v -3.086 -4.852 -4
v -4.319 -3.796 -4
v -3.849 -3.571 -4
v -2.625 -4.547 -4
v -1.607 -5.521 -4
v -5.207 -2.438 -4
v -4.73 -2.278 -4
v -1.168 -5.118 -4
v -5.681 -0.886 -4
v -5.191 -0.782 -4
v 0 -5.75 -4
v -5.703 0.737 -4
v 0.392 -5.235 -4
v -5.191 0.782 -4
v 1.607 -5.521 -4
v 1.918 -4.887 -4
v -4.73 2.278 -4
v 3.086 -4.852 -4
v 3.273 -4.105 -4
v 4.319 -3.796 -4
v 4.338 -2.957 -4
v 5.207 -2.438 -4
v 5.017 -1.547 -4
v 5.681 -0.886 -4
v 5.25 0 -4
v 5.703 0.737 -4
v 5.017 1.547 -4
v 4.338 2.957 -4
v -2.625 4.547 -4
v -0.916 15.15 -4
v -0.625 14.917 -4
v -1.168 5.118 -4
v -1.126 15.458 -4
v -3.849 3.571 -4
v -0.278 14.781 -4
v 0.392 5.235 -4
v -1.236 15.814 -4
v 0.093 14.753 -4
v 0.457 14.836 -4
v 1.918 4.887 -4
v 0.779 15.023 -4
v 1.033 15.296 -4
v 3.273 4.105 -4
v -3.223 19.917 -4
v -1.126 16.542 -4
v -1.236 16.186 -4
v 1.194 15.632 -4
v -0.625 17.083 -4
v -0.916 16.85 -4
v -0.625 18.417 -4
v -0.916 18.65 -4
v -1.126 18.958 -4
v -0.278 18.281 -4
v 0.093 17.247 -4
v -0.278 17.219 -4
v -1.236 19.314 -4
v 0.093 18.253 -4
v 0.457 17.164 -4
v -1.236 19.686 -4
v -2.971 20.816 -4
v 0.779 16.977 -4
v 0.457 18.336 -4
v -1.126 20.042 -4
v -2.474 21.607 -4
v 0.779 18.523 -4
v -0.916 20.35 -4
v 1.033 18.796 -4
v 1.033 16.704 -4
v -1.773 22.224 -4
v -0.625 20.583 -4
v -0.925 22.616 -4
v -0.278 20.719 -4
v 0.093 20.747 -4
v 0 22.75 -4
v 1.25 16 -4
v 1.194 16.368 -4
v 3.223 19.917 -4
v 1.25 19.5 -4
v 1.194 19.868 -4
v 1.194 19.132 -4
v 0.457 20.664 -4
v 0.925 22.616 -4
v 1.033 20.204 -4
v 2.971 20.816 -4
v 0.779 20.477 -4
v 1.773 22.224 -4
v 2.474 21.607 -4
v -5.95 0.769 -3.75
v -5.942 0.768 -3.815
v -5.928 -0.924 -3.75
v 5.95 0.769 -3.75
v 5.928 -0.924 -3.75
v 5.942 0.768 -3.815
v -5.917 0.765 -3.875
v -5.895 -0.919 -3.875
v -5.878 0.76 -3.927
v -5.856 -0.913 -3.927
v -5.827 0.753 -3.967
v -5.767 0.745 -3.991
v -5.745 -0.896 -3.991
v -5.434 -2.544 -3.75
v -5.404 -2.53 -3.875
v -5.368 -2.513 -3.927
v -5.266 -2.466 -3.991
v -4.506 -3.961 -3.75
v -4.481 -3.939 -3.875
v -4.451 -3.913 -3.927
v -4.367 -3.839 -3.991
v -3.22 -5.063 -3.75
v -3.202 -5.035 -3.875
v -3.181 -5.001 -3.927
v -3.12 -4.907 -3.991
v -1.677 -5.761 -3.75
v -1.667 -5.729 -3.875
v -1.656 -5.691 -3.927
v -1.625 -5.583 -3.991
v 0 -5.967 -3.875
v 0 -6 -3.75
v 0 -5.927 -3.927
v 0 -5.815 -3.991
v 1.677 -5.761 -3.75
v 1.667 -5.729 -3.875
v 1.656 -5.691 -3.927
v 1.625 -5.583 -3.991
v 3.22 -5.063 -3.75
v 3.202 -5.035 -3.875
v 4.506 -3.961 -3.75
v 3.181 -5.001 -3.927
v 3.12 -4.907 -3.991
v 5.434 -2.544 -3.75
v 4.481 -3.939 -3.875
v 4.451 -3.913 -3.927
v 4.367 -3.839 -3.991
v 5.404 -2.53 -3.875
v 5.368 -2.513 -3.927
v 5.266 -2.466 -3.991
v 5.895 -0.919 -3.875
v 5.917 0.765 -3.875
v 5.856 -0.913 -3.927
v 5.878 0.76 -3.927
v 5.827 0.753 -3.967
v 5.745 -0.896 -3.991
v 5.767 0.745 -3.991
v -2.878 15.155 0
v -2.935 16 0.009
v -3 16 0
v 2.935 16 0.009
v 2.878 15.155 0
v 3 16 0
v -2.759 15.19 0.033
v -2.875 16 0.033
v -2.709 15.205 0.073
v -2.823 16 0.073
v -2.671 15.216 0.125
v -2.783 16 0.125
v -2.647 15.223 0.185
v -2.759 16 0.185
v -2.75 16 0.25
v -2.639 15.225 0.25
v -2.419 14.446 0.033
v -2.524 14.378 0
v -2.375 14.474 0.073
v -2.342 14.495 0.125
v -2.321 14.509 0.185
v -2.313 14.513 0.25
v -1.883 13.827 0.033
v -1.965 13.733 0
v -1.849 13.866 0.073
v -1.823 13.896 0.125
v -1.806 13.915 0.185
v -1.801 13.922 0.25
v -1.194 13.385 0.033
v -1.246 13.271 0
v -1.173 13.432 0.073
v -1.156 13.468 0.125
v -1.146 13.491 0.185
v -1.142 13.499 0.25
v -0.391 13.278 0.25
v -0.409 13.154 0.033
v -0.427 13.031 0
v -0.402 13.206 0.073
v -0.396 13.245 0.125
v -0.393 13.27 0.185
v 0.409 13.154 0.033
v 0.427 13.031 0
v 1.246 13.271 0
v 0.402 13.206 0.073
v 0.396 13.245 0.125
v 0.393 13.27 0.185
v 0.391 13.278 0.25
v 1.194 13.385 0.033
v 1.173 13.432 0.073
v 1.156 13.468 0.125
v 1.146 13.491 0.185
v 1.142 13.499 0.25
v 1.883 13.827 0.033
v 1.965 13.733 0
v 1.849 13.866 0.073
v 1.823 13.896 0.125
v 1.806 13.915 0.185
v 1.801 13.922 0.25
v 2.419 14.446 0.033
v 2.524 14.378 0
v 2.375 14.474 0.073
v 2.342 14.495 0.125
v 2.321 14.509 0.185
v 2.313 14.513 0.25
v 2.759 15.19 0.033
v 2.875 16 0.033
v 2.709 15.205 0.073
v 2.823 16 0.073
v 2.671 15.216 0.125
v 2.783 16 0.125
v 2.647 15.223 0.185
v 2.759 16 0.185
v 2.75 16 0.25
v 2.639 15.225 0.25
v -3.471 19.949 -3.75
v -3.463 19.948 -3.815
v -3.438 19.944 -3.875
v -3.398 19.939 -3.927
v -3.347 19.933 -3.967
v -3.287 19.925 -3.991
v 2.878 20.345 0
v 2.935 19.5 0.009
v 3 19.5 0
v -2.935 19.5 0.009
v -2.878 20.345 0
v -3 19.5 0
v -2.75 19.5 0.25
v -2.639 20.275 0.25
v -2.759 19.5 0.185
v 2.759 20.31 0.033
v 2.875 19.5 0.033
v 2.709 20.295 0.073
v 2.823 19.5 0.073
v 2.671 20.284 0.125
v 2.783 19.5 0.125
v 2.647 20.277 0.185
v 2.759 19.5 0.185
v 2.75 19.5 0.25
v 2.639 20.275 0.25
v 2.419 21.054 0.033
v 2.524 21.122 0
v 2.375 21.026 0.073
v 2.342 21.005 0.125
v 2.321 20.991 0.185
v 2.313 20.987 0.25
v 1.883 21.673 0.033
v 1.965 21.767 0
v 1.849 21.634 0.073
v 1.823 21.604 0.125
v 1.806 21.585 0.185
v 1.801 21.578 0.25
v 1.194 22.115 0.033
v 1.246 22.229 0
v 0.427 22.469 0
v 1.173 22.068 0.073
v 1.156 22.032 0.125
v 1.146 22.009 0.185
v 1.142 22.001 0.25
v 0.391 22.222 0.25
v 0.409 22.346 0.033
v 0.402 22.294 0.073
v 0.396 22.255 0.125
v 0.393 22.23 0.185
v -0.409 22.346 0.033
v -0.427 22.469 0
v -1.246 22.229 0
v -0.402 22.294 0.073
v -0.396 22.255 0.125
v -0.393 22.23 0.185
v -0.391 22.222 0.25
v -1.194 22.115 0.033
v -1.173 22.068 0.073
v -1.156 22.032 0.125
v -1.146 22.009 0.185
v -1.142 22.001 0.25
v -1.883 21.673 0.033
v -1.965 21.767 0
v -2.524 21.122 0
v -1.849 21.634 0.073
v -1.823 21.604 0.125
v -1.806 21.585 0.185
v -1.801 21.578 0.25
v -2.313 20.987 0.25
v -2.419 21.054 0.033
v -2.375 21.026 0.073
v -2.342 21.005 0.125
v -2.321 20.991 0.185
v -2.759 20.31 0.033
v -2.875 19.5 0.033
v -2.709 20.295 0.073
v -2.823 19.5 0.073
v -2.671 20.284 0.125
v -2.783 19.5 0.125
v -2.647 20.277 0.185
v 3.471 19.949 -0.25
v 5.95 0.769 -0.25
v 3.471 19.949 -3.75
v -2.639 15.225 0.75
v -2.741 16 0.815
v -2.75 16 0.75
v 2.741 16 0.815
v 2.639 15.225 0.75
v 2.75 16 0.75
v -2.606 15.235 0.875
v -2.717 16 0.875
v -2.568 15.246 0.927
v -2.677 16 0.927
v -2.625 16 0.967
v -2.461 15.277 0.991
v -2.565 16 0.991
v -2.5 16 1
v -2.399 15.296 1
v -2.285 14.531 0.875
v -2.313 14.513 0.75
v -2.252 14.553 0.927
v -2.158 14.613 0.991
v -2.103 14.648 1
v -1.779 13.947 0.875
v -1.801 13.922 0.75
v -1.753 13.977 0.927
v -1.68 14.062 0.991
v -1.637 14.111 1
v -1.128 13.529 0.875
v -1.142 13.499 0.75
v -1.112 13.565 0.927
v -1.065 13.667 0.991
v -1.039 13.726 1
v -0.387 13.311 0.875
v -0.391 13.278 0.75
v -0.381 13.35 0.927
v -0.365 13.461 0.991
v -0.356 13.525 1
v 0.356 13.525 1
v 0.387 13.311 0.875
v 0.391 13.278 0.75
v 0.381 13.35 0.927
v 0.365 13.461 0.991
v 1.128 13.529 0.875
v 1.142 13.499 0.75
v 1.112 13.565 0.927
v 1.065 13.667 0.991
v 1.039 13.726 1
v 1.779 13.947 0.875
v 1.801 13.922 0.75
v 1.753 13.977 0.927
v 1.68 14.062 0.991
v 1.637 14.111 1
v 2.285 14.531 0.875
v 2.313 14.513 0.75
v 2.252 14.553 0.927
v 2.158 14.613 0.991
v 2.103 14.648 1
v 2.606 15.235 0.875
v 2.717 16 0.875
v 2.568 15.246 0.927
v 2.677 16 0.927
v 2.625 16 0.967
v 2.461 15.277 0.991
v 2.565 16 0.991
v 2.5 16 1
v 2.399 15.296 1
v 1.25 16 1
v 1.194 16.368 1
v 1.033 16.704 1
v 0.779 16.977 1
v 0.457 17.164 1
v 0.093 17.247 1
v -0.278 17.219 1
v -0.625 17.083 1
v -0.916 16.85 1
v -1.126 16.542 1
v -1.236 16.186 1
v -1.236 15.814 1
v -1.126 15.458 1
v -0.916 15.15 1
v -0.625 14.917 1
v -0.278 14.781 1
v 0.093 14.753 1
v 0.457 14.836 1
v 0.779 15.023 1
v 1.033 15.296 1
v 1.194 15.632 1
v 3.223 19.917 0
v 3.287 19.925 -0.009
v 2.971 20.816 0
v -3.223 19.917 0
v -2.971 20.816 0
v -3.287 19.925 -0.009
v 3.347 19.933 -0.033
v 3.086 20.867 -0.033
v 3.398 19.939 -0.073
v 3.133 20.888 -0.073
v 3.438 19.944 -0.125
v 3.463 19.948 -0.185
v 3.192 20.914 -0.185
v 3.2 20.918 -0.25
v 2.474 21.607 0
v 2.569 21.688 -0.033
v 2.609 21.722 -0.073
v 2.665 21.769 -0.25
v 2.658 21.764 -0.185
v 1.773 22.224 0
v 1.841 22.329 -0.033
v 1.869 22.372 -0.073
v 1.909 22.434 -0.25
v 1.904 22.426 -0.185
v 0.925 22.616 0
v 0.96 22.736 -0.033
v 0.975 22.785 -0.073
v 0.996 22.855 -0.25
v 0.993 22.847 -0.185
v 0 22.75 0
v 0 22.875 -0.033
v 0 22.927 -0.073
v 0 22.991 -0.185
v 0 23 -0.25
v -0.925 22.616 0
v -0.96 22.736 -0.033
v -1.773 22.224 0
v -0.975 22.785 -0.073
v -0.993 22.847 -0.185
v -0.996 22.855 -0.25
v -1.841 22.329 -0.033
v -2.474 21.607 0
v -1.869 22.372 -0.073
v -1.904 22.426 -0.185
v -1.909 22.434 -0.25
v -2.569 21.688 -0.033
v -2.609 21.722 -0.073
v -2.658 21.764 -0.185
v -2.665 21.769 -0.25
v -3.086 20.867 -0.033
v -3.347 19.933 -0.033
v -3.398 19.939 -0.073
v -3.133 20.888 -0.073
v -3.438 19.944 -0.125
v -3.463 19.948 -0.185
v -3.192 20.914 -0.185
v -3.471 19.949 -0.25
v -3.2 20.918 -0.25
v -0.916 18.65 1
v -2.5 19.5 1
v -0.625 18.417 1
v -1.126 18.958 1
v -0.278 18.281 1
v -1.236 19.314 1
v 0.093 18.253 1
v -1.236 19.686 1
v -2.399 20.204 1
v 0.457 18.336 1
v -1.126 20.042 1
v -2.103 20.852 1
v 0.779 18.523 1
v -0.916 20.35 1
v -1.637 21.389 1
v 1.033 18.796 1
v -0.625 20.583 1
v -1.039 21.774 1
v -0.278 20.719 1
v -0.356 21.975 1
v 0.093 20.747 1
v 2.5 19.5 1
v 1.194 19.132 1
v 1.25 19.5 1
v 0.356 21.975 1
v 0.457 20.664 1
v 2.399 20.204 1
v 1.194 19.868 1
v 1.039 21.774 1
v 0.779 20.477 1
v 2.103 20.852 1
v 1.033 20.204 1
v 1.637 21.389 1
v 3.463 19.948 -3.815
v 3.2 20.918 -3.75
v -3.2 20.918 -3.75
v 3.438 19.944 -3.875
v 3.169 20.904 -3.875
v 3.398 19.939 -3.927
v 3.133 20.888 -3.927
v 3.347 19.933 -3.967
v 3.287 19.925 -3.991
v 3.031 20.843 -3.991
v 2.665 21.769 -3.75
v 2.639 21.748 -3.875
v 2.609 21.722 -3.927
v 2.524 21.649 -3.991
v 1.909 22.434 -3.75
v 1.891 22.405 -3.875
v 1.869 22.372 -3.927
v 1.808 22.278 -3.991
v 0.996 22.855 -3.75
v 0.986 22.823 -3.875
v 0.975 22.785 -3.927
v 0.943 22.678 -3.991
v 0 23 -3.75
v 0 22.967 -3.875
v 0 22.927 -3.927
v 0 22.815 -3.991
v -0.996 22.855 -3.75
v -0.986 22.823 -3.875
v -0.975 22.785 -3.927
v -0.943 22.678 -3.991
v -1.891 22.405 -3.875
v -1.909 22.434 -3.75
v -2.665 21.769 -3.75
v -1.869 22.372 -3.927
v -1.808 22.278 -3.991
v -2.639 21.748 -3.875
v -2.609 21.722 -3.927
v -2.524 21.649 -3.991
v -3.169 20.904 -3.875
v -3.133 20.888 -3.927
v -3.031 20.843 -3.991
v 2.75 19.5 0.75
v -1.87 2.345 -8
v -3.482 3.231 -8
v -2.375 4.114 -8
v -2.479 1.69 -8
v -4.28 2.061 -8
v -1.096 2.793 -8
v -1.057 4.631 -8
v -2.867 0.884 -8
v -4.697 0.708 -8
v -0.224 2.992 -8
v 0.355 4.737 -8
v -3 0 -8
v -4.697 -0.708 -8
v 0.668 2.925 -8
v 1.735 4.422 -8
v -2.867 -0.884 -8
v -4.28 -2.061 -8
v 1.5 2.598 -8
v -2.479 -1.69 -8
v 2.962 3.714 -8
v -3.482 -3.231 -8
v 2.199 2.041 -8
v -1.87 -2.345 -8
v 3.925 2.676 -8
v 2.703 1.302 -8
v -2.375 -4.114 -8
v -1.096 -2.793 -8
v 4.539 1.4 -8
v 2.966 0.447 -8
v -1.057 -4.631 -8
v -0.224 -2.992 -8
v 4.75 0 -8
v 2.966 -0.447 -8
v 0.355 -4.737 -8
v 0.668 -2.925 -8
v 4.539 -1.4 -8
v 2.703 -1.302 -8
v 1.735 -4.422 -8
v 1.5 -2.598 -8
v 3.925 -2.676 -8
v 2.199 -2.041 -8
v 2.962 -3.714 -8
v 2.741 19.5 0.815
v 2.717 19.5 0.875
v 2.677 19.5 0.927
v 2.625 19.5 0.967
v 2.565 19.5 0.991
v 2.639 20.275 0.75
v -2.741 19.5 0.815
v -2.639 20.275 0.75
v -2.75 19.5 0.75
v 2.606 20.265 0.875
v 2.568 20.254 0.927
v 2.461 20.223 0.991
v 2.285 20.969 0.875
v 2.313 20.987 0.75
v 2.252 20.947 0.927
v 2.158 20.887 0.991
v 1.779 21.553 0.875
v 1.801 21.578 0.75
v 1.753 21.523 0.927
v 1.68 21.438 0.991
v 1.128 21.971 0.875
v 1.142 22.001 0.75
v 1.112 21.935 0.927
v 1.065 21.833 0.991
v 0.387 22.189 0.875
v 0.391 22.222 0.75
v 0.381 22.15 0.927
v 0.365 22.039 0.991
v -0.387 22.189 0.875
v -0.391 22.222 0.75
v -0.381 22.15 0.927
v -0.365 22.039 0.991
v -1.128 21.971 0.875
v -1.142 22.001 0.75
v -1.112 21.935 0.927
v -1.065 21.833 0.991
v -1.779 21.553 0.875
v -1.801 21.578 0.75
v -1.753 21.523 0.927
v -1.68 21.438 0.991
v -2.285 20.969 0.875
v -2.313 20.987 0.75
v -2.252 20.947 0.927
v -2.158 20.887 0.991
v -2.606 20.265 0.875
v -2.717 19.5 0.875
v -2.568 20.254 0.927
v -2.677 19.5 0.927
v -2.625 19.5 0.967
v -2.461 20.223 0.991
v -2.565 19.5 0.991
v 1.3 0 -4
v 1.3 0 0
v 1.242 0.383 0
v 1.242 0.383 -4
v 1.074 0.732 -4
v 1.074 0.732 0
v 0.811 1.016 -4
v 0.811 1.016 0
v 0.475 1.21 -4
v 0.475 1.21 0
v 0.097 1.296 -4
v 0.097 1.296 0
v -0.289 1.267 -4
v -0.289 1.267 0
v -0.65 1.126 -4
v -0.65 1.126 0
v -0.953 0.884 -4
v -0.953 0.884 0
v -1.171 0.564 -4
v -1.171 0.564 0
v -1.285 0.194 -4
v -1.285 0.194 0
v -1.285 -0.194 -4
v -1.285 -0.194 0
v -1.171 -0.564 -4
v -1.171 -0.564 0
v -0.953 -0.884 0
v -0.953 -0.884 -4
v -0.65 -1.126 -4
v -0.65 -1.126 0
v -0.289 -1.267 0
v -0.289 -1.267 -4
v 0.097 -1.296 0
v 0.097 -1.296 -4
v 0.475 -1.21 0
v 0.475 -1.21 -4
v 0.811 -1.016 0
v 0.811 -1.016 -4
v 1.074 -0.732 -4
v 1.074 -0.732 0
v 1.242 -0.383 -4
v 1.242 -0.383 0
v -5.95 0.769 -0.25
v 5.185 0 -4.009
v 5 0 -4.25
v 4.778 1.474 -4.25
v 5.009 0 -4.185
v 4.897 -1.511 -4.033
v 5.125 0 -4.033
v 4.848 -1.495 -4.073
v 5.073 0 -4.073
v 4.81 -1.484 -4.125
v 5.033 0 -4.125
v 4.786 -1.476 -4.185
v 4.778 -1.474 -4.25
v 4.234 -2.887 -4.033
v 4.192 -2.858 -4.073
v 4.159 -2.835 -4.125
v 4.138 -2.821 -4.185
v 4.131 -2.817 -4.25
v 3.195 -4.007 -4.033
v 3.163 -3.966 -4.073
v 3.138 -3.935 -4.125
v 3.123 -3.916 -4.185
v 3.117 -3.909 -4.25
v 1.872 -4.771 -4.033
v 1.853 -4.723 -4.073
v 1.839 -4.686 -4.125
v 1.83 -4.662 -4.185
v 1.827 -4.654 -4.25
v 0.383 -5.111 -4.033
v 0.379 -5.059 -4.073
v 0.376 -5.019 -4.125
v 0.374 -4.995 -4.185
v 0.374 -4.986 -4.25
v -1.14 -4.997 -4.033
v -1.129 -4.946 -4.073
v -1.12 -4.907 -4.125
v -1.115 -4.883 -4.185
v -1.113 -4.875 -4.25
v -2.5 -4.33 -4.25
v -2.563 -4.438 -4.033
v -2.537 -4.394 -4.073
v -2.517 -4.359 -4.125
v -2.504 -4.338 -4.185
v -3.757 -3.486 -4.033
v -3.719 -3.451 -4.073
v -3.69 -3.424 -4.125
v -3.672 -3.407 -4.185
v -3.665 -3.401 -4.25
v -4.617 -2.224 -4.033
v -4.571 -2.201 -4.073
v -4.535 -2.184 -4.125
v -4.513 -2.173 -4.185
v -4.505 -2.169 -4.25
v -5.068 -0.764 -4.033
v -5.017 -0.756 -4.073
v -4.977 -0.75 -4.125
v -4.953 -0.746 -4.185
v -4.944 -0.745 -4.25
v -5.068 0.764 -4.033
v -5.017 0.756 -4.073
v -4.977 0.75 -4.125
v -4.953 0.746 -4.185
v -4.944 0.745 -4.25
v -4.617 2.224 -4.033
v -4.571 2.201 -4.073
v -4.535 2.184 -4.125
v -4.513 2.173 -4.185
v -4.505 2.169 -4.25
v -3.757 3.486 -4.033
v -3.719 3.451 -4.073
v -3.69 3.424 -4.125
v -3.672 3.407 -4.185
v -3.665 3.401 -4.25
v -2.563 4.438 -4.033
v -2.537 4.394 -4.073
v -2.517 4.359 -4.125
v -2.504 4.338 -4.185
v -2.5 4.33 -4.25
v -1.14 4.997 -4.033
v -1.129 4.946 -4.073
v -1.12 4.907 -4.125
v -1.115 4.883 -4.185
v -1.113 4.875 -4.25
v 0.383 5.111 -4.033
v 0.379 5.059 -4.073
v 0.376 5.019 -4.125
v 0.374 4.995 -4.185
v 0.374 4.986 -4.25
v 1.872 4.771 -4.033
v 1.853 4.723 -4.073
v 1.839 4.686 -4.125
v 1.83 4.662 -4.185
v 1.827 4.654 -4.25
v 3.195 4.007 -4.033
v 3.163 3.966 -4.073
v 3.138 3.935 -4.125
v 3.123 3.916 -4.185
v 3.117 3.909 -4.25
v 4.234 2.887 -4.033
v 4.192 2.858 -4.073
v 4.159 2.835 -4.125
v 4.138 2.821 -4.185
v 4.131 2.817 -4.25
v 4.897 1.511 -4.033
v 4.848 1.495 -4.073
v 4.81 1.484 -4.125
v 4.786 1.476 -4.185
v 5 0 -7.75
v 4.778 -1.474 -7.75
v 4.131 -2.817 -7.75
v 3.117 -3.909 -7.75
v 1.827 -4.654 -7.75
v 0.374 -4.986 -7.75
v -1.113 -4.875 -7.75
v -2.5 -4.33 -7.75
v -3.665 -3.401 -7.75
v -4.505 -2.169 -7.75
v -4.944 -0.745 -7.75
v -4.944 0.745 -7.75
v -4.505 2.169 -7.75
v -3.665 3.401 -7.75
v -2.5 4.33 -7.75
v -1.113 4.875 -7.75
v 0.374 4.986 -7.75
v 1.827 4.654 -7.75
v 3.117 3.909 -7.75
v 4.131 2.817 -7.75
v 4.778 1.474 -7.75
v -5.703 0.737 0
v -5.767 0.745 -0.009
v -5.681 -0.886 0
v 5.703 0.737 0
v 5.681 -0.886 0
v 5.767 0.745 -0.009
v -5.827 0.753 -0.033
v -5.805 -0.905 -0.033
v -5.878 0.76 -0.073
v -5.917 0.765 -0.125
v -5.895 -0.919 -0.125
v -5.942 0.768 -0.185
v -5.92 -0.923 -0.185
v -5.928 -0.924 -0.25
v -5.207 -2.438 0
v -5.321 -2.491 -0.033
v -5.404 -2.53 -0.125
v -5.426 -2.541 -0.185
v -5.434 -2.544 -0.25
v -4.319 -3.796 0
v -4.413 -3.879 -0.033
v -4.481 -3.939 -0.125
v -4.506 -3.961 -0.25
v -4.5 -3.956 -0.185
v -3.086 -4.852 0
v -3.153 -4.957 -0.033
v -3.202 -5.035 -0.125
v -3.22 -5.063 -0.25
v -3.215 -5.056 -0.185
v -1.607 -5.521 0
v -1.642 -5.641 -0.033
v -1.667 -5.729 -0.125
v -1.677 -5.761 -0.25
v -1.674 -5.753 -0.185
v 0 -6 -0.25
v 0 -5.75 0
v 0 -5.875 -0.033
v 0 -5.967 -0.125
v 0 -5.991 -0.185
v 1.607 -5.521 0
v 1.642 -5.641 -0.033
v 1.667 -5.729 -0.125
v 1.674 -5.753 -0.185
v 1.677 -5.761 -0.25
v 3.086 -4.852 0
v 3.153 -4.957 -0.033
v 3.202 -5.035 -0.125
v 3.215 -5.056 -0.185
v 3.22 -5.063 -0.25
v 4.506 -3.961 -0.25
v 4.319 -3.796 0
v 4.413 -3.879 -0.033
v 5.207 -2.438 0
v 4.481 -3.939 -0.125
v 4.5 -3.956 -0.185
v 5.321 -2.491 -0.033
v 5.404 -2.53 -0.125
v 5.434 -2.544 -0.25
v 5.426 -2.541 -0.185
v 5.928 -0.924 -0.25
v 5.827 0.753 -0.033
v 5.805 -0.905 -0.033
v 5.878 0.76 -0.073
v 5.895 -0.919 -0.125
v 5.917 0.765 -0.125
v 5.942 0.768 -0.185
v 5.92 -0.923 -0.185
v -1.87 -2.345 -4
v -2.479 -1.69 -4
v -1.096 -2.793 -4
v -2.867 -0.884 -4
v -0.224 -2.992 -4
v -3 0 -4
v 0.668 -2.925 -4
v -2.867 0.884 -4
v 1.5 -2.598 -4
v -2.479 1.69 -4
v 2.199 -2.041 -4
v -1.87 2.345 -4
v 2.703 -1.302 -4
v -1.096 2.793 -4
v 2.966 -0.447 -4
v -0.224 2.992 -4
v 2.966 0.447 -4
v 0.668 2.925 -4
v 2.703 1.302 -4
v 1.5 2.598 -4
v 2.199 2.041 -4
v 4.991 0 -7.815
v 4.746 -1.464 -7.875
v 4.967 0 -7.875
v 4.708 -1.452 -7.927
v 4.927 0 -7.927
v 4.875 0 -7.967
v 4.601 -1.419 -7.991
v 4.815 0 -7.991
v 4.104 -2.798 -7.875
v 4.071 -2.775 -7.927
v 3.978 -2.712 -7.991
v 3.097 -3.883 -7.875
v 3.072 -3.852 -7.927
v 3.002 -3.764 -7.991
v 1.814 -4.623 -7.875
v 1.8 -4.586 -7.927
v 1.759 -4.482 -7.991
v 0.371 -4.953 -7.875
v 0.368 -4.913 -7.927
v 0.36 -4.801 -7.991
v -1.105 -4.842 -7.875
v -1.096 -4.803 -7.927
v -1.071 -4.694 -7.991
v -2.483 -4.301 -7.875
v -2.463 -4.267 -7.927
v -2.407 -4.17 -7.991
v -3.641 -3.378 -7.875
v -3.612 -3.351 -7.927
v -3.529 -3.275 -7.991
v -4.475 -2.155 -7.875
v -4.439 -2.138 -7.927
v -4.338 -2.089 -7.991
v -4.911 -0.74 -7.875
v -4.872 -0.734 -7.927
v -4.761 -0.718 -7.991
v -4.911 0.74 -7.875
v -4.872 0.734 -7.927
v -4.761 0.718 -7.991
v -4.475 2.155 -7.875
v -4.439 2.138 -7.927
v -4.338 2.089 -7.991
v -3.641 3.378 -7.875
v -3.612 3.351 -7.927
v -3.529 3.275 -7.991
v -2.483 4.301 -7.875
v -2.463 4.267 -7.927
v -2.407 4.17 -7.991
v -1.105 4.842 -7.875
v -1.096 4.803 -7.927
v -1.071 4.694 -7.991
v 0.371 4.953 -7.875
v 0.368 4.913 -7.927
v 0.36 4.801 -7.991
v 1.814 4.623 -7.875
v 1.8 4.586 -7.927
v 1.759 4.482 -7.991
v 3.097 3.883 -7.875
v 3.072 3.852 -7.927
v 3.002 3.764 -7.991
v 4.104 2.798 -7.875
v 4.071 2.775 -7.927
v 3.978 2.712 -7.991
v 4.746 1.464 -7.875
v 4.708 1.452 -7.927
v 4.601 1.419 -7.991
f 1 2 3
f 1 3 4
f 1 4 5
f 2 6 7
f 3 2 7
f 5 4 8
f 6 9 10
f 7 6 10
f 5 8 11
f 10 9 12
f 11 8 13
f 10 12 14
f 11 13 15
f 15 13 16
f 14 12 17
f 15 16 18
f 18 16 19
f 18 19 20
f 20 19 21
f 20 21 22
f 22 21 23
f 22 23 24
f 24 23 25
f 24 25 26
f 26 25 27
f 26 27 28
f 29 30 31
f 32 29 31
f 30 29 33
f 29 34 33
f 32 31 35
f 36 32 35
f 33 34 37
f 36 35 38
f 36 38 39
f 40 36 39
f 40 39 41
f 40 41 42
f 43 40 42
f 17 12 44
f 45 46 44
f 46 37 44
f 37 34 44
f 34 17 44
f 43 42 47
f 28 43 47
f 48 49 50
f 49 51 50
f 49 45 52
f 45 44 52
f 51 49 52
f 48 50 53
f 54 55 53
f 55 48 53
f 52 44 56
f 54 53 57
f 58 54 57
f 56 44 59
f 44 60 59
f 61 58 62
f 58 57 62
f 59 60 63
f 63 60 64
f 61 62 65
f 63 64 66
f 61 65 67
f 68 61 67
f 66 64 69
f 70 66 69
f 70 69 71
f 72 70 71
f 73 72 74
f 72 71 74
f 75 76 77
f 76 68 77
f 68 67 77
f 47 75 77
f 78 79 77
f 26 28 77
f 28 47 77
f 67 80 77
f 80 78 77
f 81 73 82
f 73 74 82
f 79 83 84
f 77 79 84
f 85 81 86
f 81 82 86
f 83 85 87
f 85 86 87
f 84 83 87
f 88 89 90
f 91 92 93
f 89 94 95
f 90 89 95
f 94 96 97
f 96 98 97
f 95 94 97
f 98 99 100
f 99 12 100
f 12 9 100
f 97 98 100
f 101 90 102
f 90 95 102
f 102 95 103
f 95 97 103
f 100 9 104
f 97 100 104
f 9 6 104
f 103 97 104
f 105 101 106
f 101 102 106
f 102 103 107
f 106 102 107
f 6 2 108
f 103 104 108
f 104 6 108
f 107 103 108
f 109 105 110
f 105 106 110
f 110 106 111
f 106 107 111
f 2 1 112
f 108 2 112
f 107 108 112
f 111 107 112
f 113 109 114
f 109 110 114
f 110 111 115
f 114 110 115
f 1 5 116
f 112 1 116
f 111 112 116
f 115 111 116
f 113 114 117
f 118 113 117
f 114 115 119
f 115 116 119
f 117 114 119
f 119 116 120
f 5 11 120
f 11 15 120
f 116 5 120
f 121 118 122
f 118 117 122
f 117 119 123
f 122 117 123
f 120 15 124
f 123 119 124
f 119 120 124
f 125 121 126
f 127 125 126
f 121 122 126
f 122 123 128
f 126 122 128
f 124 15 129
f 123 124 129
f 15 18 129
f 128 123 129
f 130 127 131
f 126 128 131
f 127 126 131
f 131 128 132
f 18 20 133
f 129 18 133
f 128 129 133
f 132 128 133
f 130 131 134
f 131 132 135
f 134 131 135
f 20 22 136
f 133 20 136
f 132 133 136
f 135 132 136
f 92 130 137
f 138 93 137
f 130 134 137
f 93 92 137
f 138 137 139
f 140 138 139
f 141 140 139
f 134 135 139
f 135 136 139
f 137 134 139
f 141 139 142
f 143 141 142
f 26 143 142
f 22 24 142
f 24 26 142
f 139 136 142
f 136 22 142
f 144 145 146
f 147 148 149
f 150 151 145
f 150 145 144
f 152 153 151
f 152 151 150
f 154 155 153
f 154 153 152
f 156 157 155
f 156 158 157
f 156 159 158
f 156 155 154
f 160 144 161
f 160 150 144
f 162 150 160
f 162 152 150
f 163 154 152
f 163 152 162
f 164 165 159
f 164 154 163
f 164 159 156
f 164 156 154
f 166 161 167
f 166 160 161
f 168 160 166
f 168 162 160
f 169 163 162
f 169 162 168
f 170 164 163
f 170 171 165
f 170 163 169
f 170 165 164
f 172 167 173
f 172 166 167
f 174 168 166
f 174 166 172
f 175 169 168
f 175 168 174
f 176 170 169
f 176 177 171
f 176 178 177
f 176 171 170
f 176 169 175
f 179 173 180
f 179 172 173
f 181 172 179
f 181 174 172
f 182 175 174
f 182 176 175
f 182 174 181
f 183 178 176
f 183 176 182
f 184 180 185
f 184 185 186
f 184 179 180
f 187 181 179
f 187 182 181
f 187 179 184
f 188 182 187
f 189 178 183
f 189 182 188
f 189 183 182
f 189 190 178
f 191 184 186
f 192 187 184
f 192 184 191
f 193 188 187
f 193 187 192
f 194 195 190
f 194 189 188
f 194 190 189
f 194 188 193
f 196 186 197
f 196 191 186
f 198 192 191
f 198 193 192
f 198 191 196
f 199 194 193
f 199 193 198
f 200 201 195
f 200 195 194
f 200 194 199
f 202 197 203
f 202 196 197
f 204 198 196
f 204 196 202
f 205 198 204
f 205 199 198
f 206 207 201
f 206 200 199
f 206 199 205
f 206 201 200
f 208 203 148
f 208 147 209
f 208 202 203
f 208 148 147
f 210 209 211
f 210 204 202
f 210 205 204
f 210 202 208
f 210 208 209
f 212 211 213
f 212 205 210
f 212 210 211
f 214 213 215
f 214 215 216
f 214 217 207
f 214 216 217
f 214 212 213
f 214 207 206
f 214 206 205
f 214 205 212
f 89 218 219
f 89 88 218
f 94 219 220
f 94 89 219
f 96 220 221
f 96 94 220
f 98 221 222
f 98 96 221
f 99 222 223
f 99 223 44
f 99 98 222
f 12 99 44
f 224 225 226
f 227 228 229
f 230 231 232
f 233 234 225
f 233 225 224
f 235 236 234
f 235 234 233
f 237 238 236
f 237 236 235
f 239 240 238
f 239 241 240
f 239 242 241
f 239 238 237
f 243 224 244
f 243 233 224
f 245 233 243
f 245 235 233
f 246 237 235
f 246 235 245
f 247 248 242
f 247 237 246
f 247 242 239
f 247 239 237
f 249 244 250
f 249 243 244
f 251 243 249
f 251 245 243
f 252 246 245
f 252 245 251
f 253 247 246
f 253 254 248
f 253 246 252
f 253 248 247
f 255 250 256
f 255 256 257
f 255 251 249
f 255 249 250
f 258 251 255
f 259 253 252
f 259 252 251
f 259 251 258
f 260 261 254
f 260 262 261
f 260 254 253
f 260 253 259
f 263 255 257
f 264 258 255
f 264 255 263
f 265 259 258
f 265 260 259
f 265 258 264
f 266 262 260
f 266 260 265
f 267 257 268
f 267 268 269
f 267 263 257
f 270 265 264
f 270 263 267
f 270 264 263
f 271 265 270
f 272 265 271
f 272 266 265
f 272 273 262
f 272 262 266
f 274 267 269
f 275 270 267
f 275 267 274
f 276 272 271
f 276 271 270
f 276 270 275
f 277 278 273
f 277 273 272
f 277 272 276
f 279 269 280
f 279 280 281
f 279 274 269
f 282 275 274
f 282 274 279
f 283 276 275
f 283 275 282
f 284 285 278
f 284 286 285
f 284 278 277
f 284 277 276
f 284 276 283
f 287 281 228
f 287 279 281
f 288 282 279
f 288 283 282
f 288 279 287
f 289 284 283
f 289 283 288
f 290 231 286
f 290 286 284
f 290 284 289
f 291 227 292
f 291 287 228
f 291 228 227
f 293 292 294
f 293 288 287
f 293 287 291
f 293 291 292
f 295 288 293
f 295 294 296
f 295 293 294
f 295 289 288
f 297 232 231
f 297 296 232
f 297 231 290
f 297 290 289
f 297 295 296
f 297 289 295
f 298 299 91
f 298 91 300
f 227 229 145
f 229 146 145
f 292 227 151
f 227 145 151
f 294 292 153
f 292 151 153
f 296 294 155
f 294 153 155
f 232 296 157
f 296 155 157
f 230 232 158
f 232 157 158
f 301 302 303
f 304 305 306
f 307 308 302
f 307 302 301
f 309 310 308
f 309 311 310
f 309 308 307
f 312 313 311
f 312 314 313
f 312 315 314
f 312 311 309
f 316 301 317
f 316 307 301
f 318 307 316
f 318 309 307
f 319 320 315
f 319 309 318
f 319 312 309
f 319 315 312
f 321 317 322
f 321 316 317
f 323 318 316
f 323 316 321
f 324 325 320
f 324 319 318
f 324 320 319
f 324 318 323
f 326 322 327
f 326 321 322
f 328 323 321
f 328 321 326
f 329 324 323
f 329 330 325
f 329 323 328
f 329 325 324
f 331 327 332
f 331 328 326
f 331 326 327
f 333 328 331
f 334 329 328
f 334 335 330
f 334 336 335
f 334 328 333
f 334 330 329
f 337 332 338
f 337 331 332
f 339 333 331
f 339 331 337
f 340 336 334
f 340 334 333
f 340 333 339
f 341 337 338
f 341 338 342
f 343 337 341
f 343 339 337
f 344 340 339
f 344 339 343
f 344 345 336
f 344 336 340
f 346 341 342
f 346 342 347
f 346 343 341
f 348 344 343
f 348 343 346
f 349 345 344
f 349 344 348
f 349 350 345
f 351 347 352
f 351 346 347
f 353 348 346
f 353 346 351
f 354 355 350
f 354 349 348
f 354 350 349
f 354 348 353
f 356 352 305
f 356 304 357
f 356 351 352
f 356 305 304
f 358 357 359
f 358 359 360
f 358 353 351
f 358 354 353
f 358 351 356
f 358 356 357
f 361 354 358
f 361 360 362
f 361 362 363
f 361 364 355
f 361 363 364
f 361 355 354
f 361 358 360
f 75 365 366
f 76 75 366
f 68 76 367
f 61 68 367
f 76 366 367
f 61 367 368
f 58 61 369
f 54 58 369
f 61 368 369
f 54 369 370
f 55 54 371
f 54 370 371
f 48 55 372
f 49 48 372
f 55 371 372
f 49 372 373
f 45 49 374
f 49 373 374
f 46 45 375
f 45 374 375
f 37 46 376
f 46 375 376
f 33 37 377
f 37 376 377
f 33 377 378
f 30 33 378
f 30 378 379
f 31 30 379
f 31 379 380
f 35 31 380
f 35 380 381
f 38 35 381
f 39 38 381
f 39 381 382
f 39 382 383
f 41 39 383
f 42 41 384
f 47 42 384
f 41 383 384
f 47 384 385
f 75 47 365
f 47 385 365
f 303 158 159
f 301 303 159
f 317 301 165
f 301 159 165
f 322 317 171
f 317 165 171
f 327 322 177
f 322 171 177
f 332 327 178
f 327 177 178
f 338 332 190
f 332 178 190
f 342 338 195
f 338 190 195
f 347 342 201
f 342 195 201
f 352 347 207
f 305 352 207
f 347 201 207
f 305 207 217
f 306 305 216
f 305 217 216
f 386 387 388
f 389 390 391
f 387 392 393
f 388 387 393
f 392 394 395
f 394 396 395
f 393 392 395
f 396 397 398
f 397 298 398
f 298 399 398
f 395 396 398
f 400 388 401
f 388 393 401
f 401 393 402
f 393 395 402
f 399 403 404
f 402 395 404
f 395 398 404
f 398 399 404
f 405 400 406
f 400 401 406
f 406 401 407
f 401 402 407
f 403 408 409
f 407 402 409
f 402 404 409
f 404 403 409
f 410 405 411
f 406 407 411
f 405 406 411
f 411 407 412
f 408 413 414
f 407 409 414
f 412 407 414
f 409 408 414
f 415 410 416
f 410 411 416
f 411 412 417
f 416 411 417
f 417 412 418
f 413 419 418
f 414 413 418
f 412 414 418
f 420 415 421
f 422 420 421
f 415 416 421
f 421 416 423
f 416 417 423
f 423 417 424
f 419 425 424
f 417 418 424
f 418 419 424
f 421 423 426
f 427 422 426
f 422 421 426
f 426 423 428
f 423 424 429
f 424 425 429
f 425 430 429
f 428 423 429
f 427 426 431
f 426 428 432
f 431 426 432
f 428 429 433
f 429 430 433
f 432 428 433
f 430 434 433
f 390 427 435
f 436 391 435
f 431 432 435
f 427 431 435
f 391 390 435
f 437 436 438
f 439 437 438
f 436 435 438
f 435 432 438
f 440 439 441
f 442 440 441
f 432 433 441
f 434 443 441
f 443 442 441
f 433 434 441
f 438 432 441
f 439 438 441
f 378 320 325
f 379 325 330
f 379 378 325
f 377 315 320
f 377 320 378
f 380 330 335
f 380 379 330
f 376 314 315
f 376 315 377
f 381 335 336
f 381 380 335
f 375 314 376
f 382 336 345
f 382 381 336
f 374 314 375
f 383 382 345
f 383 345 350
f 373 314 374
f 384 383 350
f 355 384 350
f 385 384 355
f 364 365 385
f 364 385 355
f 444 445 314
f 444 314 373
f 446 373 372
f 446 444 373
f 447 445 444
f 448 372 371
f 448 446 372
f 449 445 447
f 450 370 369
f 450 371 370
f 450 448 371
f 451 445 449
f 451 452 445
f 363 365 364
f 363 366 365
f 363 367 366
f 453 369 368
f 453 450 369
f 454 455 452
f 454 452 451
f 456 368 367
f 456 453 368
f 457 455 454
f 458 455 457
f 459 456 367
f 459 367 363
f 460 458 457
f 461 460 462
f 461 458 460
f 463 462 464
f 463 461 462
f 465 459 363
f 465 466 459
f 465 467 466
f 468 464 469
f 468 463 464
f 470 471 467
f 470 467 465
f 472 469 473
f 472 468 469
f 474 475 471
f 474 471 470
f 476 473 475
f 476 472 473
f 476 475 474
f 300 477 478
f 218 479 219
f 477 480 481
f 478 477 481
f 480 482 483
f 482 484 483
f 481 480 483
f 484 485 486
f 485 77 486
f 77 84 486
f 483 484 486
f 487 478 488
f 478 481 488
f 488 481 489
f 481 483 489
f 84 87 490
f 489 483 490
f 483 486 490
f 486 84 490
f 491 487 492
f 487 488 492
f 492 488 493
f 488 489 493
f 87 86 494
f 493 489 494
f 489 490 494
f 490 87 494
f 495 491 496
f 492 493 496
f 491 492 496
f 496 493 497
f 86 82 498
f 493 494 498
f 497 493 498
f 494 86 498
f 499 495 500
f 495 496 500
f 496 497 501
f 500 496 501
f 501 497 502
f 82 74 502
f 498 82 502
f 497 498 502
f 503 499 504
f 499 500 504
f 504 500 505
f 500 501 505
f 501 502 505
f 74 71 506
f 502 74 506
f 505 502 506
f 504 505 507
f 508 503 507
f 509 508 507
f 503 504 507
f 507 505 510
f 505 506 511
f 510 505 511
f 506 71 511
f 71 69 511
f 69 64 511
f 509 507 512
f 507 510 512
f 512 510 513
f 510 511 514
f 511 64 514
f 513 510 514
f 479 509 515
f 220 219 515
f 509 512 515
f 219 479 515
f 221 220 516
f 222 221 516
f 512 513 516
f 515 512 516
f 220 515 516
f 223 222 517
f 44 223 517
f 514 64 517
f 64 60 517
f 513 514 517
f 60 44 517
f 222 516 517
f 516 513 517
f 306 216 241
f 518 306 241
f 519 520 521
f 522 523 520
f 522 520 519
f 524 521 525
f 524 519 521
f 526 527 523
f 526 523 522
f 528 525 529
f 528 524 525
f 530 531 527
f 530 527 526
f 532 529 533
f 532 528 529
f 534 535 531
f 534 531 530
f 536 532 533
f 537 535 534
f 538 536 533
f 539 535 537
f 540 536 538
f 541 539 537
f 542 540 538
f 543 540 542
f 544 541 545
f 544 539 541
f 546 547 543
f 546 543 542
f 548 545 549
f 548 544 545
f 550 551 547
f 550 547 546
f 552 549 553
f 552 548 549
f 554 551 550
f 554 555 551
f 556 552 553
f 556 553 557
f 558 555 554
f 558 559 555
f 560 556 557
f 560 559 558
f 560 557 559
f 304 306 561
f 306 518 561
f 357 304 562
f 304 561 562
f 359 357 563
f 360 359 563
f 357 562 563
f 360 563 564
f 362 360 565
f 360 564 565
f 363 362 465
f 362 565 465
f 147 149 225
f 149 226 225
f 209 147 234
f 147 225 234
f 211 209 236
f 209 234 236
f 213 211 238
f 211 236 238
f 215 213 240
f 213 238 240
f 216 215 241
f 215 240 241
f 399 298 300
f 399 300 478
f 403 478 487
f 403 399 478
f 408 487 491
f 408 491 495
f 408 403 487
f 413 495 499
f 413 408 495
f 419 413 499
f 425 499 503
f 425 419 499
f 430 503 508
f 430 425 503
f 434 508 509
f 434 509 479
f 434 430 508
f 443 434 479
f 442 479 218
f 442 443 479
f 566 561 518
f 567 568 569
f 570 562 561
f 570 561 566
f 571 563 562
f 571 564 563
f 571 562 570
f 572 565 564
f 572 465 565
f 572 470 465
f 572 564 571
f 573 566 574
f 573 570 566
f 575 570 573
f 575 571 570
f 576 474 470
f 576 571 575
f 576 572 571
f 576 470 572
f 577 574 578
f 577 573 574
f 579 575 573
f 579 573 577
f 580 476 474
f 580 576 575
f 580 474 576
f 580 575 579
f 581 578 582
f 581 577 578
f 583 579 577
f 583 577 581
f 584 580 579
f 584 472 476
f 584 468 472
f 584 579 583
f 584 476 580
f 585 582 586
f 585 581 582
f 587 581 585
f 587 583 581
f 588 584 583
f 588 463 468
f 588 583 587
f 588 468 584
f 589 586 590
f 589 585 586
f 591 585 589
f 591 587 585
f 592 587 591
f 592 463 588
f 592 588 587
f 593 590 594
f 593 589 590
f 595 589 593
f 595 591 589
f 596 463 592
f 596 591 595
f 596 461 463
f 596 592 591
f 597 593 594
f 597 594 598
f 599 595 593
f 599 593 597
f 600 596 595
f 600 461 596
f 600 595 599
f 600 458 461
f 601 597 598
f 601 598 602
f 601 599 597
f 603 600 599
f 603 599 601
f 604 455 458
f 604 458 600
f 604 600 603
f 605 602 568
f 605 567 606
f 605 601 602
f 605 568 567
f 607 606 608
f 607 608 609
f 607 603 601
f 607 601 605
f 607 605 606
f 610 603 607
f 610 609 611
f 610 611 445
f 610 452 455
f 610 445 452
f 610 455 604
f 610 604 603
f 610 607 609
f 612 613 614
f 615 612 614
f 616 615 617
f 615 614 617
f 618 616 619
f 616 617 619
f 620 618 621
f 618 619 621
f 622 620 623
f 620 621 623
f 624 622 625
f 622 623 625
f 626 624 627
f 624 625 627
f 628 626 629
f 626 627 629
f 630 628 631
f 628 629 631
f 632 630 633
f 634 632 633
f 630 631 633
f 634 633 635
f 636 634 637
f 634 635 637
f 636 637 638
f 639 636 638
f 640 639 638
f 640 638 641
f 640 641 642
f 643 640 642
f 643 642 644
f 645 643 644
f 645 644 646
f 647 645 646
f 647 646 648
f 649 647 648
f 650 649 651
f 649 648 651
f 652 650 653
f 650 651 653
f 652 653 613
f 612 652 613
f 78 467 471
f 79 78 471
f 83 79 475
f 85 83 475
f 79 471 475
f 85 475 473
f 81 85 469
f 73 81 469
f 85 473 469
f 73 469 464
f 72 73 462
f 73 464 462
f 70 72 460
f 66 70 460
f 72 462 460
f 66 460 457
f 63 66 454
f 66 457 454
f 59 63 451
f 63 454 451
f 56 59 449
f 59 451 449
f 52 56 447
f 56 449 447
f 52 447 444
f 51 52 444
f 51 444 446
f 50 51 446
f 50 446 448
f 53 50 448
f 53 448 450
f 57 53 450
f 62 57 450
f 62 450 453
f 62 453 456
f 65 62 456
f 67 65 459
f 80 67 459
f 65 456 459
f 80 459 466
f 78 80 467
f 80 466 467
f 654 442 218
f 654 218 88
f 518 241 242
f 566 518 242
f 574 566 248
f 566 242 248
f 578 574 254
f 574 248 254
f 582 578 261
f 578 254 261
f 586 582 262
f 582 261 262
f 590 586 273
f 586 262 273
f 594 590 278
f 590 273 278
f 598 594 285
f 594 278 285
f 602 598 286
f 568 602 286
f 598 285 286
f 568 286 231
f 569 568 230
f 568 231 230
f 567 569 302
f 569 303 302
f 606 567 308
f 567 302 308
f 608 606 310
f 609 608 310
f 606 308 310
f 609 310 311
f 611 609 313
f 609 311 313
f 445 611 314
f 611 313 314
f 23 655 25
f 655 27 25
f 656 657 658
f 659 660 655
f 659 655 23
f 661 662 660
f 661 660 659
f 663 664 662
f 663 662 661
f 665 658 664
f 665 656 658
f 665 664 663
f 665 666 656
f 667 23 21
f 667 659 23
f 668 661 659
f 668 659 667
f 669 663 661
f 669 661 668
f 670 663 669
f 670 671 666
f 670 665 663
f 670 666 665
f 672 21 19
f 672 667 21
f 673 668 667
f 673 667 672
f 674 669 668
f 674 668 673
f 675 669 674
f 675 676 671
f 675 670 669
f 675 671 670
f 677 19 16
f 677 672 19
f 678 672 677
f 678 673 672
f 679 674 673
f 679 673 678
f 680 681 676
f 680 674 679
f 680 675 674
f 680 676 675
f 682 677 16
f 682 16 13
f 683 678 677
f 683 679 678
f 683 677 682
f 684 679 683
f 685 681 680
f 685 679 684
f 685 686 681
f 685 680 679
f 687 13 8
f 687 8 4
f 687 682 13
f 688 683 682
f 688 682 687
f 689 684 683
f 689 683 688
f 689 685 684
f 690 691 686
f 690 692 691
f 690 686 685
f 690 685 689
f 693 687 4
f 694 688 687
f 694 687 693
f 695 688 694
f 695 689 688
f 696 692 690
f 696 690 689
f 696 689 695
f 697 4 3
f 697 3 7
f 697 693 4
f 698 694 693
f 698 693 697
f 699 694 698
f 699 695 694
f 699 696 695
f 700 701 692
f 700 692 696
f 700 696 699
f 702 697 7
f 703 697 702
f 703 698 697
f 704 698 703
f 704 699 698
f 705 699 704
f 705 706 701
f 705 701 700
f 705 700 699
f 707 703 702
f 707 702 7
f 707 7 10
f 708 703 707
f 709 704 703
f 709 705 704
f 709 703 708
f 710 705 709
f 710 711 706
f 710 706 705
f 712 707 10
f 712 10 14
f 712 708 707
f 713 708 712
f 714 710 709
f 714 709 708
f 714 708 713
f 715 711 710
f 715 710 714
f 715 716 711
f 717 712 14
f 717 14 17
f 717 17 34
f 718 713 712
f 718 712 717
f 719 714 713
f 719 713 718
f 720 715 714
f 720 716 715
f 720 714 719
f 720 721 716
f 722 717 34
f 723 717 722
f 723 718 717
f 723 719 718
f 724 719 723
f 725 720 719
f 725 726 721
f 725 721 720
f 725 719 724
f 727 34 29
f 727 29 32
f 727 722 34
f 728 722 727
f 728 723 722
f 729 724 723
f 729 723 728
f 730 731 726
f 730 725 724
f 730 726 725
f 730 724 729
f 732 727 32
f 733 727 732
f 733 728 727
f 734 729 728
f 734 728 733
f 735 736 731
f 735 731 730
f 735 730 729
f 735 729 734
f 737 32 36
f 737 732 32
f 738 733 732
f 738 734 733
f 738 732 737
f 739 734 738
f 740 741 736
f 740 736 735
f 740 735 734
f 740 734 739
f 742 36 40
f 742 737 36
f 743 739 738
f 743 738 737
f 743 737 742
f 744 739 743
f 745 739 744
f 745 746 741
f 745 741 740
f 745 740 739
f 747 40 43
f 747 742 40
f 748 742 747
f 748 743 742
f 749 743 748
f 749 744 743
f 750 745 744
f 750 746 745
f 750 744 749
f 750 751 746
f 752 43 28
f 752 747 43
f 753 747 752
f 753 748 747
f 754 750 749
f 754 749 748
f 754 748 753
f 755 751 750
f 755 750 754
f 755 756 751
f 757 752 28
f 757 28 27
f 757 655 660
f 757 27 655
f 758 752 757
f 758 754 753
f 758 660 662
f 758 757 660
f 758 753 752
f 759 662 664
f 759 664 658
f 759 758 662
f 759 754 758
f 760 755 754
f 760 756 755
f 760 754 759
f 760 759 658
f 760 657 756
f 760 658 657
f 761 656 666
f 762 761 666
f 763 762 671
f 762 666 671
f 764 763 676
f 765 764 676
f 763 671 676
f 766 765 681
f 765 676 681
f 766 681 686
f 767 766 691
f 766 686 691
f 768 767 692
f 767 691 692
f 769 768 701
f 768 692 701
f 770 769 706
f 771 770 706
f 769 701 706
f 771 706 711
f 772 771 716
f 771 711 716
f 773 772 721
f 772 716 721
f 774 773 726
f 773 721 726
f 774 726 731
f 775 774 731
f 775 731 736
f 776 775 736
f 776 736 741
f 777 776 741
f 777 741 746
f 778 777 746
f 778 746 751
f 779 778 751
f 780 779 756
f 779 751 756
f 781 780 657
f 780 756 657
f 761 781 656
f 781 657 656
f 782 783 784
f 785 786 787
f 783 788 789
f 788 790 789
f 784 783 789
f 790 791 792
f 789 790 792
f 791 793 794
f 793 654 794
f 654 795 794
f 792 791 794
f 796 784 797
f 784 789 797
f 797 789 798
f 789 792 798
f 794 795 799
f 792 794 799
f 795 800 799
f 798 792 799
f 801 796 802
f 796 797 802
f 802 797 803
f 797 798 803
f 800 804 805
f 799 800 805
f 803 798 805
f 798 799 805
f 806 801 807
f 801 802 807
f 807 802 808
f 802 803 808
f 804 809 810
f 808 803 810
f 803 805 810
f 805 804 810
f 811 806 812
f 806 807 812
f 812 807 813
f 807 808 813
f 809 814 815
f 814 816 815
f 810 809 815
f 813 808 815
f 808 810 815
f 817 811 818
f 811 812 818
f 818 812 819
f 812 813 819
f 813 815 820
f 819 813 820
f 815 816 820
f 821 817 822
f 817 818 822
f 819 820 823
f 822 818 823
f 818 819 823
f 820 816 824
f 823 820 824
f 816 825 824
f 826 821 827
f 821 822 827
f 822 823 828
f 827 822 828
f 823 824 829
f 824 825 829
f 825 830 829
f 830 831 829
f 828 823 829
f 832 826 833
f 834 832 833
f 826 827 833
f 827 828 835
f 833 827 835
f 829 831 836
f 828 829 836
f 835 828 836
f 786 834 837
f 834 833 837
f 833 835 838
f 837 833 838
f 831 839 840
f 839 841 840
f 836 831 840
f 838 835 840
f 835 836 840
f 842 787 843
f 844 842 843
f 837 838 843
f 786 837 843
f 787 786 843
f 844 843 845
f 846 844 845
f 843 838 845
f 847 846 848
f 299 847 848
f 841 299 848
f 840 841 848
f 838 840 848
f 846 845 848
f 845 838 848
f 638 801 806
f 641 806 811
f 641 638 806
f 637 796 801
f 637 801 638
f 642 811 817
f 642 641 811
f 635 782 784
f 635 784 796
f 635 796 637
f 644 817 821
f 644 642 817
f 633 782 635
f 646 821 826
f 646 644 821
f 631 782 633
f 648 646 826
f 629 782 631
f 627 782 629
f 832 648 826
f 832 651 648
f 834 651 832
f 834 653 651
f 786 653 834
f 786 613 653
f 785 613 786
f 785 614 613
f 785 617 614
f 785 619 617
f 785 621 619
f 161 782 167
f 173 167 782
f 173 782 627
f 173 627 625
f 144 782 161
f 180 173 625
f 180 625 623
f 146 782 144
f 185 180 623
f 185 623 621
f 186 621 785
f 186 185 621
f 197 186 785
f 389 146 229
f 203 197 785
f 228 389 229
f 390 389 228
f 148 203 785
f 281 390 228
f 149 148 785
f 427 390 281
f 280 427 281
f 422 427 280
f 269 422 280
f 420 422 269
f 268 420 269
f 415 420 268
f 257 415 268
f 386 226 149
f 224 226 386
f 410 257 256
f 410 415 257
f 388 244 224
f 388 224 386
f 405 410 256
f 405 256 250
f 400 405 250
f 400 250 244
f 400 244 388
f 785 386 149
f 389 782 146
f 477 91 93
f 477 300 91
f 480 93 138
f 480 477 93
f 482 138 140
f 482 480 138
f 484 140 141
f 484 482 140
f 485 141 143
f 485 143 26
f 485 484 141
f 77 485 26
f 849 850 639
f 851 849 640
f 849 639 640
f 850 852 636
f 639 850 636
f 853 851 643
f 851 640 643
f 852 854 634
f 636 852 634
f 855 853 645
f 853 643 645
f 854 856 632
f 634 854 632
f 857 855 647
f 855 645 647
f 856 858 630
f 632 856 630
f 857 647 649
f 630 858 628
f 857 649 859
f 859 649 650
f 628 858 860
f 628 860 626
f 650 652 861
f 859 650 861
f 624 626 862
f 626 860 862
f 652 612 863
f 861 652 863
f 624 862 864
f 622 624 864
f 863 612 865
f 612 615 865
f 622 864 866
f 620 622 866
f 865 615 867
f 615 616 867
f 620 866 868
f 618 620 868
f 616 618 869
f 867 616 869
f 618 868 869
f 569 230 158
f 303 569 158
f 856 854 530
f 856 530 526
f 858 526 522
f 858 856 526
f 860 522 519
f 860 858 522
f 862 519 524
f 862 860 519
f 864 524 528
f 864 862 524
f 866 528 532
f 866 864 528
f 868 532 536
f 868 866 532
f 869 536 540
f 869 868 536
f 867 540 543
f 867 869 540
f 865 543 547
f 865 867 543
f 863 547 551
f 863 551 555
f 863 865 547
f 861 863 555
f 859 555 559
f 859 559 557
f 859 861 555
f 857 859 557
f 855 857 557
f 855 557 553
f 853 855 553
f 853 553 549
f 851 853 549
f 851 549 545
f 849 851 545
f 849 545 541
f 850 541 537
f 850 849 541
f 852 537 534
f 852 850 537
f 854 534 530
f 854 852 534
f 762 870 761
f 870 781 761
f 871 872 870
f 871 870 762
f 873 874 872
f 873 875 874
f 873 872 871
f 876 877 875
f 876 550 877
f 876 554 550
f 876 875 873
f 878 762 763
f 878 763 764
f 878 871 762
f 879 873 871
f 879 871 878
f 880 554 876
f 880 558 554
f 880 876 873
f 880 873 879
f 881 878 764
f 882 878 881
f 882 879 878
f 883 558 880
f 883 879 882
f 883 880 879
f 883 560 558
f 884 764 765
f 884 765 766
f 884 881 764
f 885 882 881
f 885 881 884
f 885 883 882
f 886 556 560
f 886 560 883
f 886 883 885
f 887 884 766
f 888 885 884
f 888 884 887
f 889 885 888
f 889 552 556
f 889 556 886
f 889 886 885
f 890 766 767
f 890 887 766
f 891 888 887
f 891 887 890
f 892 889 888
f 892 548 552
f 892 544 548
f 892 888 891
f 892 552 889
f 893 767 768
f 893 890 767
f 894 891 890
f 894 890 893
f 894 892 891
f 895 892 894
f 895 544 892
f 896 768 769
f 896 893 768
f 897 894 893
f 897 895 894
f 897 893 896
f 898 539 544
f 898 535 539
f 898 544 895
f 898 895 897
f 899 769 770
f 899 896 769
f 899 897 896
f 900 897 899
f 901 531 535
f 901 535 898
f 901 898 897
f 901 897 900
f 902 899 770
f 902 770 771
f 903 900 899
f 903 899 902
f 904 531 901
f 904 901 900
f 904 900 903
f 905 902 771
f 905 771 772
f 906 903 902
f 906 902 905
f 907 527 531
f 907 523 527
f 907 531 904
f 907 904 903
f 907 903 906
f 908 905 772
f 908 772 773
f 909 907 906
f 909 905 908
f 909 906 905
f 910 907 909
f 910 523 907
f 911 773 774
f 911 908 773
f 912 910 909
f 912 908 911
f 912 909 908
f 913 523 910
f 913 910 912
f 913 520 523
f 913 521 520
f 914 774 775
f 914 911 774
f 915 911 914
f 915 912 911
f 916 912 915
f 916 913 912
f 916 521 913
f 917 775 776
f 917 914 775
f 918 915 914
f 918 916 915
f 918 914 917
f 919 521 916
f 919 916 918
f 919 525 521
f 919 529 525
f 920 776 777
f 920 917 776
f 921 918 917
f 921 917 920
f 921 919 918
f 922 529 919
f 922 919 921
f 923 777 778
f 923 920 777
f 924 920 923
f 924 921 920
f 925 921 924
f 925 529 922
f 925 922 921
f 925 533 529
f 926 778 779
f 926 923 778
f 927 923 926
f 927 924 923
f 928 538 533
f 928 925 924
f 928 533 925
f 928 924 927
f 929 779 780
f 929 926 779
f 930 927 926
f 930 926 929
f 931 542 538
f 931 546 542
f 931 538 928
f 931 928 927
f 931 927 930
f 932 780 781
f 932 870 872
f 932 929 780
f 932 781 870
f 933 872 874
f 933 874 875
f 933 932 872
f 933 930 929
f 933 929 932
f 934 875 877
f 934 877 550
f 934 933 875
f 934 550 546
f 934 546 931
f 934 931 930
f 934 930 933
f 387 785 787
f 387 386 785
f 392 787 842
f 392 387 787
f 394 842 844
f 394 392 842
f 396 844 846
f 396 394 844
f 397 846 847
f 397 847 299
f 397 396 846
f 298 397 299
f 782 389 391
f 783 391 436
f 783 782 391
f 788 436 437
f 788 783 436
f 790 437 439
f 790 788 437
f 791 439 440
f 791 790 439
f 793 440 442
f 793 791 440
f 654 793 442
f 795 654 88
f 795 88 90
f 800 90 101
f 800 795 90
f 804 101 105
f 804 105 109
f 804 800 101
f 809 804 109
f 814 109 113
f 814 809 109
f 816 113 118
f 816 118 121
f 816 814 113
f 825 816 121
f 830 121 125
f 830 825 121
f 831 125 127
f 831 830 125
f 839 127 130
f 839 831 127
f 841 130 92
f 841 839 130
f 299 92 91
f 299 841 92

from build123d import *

# Parameters (mm, degrees)
SKETCH1_R           = 1.3
BOSS_EXTRUDE1_DEPTH = 4
BOSS_EXTRUDE2_DEPTH = 1
SKETCH3_R           = 5
SKETCH3_R_2         = 3
BOSS_EXTRUDE3_DEPTH = 4
SKETCH4_R           = 1.25
CUT_EXTRUDE1_DEPTH  = 5
FILLET1_R           = 0.25


with BuildPart() as part:
    # Sketch1 → Boss-Extrude1 (new body)
    with BuildSketch(Plane.XY):
        with BuildLine():
            Line((-3.471116852, 19.948717949), (-5.950486033, 0.769230769))
            ThreePointArc((-5.950486033, 0.769230769), (0, -6), (5.950486033, 0.769230769))
            Line((5.950486033, 0.769230769), (3.471116852, 19.948717949))
            ThreePointArc((3.471116852, 19.948717949), (0, 23), (-3.471116852, 19.948717949))
        make_face()
        Circle(SKETCH1_R, mode=Mode.SUBTRACT)
    extrude(amount=-BOSS_EXTRUDE1_DEPTH)

    # Sketch2 → Boss-Extrude2 (add)
    with BuildSketch(Plane.XY):
        with BuildLine():
            Line((-2.75, 19.5), (-2.75, 16))
            ThreePointArc((-2.75, 16), (0, 13.25), (2.75, 16))
            Line((2.75, 16), (2.75, 19.5))
            ThreePointArc((2.75, 19.5), (0, 22.25), (-2.75, 19.5))
        make_face()
    extrude(amount=BOSS_EXTRUDE2_DEPTH)

    # Sketch3 → Boss-Extrude3 (add)
    with BuildSketch(Plane(origin=(0, 0, -4), x_dir=(-1, 0, 0), z_dir=(0, 0, -1))):
        with Locations(Location((0, 0, 0), (0, 0, 180))):
            Circle(SKETCH3_R)
        Circle(SKETCH3_R_2, mode=Mode.SUBTRACT)
    extrude(amount=BOSS_EXTRUDE3_DEPTH)

    # Sketch4 → Cut-Extrude1 (cut)
    with BuildSketch(Plane.XY.offset(1)):
        with Locations((0, 19.5)):
            Circle(SKETCH4_R)
        with Locations((0, 16)):
            Circle(SKETCH4_R)
    extrude(amount=-CUT_EXTRUDE1_DEPTH, mode=Mode.SUBTRACT)

    # Fillet1
    fillet1_edges = [part.edges().sort_by_distance(p)[0] for p in [
        (0, -6, -4),
        (4.710801442, 10.358974359, -4),
        (0, 22.25, 0),
        (-2.75, 17.75, 0),
        (0, 13.25, 0),
        (2.75, 17.75, 0),
        (0, 22.25, 1),
        (-2.75, 17.75, 1),
        (0, 13.25, 1),
        (2.75, 17.75, 1),
        (-5, 0, -4),
        (-5, 0, -8),
        (0, 23, -4),
        (4.710801442, 10.358974359, 0),
        (0, -6, 0),
        (-4.710801442, 10.358974359, 0),
        (0, 23, 0),
        (-4.710801442, 10.358974359, -4),
    ]]
    fillet(fillet1_edges, radius=FILLET1_R)


solid = part.part
